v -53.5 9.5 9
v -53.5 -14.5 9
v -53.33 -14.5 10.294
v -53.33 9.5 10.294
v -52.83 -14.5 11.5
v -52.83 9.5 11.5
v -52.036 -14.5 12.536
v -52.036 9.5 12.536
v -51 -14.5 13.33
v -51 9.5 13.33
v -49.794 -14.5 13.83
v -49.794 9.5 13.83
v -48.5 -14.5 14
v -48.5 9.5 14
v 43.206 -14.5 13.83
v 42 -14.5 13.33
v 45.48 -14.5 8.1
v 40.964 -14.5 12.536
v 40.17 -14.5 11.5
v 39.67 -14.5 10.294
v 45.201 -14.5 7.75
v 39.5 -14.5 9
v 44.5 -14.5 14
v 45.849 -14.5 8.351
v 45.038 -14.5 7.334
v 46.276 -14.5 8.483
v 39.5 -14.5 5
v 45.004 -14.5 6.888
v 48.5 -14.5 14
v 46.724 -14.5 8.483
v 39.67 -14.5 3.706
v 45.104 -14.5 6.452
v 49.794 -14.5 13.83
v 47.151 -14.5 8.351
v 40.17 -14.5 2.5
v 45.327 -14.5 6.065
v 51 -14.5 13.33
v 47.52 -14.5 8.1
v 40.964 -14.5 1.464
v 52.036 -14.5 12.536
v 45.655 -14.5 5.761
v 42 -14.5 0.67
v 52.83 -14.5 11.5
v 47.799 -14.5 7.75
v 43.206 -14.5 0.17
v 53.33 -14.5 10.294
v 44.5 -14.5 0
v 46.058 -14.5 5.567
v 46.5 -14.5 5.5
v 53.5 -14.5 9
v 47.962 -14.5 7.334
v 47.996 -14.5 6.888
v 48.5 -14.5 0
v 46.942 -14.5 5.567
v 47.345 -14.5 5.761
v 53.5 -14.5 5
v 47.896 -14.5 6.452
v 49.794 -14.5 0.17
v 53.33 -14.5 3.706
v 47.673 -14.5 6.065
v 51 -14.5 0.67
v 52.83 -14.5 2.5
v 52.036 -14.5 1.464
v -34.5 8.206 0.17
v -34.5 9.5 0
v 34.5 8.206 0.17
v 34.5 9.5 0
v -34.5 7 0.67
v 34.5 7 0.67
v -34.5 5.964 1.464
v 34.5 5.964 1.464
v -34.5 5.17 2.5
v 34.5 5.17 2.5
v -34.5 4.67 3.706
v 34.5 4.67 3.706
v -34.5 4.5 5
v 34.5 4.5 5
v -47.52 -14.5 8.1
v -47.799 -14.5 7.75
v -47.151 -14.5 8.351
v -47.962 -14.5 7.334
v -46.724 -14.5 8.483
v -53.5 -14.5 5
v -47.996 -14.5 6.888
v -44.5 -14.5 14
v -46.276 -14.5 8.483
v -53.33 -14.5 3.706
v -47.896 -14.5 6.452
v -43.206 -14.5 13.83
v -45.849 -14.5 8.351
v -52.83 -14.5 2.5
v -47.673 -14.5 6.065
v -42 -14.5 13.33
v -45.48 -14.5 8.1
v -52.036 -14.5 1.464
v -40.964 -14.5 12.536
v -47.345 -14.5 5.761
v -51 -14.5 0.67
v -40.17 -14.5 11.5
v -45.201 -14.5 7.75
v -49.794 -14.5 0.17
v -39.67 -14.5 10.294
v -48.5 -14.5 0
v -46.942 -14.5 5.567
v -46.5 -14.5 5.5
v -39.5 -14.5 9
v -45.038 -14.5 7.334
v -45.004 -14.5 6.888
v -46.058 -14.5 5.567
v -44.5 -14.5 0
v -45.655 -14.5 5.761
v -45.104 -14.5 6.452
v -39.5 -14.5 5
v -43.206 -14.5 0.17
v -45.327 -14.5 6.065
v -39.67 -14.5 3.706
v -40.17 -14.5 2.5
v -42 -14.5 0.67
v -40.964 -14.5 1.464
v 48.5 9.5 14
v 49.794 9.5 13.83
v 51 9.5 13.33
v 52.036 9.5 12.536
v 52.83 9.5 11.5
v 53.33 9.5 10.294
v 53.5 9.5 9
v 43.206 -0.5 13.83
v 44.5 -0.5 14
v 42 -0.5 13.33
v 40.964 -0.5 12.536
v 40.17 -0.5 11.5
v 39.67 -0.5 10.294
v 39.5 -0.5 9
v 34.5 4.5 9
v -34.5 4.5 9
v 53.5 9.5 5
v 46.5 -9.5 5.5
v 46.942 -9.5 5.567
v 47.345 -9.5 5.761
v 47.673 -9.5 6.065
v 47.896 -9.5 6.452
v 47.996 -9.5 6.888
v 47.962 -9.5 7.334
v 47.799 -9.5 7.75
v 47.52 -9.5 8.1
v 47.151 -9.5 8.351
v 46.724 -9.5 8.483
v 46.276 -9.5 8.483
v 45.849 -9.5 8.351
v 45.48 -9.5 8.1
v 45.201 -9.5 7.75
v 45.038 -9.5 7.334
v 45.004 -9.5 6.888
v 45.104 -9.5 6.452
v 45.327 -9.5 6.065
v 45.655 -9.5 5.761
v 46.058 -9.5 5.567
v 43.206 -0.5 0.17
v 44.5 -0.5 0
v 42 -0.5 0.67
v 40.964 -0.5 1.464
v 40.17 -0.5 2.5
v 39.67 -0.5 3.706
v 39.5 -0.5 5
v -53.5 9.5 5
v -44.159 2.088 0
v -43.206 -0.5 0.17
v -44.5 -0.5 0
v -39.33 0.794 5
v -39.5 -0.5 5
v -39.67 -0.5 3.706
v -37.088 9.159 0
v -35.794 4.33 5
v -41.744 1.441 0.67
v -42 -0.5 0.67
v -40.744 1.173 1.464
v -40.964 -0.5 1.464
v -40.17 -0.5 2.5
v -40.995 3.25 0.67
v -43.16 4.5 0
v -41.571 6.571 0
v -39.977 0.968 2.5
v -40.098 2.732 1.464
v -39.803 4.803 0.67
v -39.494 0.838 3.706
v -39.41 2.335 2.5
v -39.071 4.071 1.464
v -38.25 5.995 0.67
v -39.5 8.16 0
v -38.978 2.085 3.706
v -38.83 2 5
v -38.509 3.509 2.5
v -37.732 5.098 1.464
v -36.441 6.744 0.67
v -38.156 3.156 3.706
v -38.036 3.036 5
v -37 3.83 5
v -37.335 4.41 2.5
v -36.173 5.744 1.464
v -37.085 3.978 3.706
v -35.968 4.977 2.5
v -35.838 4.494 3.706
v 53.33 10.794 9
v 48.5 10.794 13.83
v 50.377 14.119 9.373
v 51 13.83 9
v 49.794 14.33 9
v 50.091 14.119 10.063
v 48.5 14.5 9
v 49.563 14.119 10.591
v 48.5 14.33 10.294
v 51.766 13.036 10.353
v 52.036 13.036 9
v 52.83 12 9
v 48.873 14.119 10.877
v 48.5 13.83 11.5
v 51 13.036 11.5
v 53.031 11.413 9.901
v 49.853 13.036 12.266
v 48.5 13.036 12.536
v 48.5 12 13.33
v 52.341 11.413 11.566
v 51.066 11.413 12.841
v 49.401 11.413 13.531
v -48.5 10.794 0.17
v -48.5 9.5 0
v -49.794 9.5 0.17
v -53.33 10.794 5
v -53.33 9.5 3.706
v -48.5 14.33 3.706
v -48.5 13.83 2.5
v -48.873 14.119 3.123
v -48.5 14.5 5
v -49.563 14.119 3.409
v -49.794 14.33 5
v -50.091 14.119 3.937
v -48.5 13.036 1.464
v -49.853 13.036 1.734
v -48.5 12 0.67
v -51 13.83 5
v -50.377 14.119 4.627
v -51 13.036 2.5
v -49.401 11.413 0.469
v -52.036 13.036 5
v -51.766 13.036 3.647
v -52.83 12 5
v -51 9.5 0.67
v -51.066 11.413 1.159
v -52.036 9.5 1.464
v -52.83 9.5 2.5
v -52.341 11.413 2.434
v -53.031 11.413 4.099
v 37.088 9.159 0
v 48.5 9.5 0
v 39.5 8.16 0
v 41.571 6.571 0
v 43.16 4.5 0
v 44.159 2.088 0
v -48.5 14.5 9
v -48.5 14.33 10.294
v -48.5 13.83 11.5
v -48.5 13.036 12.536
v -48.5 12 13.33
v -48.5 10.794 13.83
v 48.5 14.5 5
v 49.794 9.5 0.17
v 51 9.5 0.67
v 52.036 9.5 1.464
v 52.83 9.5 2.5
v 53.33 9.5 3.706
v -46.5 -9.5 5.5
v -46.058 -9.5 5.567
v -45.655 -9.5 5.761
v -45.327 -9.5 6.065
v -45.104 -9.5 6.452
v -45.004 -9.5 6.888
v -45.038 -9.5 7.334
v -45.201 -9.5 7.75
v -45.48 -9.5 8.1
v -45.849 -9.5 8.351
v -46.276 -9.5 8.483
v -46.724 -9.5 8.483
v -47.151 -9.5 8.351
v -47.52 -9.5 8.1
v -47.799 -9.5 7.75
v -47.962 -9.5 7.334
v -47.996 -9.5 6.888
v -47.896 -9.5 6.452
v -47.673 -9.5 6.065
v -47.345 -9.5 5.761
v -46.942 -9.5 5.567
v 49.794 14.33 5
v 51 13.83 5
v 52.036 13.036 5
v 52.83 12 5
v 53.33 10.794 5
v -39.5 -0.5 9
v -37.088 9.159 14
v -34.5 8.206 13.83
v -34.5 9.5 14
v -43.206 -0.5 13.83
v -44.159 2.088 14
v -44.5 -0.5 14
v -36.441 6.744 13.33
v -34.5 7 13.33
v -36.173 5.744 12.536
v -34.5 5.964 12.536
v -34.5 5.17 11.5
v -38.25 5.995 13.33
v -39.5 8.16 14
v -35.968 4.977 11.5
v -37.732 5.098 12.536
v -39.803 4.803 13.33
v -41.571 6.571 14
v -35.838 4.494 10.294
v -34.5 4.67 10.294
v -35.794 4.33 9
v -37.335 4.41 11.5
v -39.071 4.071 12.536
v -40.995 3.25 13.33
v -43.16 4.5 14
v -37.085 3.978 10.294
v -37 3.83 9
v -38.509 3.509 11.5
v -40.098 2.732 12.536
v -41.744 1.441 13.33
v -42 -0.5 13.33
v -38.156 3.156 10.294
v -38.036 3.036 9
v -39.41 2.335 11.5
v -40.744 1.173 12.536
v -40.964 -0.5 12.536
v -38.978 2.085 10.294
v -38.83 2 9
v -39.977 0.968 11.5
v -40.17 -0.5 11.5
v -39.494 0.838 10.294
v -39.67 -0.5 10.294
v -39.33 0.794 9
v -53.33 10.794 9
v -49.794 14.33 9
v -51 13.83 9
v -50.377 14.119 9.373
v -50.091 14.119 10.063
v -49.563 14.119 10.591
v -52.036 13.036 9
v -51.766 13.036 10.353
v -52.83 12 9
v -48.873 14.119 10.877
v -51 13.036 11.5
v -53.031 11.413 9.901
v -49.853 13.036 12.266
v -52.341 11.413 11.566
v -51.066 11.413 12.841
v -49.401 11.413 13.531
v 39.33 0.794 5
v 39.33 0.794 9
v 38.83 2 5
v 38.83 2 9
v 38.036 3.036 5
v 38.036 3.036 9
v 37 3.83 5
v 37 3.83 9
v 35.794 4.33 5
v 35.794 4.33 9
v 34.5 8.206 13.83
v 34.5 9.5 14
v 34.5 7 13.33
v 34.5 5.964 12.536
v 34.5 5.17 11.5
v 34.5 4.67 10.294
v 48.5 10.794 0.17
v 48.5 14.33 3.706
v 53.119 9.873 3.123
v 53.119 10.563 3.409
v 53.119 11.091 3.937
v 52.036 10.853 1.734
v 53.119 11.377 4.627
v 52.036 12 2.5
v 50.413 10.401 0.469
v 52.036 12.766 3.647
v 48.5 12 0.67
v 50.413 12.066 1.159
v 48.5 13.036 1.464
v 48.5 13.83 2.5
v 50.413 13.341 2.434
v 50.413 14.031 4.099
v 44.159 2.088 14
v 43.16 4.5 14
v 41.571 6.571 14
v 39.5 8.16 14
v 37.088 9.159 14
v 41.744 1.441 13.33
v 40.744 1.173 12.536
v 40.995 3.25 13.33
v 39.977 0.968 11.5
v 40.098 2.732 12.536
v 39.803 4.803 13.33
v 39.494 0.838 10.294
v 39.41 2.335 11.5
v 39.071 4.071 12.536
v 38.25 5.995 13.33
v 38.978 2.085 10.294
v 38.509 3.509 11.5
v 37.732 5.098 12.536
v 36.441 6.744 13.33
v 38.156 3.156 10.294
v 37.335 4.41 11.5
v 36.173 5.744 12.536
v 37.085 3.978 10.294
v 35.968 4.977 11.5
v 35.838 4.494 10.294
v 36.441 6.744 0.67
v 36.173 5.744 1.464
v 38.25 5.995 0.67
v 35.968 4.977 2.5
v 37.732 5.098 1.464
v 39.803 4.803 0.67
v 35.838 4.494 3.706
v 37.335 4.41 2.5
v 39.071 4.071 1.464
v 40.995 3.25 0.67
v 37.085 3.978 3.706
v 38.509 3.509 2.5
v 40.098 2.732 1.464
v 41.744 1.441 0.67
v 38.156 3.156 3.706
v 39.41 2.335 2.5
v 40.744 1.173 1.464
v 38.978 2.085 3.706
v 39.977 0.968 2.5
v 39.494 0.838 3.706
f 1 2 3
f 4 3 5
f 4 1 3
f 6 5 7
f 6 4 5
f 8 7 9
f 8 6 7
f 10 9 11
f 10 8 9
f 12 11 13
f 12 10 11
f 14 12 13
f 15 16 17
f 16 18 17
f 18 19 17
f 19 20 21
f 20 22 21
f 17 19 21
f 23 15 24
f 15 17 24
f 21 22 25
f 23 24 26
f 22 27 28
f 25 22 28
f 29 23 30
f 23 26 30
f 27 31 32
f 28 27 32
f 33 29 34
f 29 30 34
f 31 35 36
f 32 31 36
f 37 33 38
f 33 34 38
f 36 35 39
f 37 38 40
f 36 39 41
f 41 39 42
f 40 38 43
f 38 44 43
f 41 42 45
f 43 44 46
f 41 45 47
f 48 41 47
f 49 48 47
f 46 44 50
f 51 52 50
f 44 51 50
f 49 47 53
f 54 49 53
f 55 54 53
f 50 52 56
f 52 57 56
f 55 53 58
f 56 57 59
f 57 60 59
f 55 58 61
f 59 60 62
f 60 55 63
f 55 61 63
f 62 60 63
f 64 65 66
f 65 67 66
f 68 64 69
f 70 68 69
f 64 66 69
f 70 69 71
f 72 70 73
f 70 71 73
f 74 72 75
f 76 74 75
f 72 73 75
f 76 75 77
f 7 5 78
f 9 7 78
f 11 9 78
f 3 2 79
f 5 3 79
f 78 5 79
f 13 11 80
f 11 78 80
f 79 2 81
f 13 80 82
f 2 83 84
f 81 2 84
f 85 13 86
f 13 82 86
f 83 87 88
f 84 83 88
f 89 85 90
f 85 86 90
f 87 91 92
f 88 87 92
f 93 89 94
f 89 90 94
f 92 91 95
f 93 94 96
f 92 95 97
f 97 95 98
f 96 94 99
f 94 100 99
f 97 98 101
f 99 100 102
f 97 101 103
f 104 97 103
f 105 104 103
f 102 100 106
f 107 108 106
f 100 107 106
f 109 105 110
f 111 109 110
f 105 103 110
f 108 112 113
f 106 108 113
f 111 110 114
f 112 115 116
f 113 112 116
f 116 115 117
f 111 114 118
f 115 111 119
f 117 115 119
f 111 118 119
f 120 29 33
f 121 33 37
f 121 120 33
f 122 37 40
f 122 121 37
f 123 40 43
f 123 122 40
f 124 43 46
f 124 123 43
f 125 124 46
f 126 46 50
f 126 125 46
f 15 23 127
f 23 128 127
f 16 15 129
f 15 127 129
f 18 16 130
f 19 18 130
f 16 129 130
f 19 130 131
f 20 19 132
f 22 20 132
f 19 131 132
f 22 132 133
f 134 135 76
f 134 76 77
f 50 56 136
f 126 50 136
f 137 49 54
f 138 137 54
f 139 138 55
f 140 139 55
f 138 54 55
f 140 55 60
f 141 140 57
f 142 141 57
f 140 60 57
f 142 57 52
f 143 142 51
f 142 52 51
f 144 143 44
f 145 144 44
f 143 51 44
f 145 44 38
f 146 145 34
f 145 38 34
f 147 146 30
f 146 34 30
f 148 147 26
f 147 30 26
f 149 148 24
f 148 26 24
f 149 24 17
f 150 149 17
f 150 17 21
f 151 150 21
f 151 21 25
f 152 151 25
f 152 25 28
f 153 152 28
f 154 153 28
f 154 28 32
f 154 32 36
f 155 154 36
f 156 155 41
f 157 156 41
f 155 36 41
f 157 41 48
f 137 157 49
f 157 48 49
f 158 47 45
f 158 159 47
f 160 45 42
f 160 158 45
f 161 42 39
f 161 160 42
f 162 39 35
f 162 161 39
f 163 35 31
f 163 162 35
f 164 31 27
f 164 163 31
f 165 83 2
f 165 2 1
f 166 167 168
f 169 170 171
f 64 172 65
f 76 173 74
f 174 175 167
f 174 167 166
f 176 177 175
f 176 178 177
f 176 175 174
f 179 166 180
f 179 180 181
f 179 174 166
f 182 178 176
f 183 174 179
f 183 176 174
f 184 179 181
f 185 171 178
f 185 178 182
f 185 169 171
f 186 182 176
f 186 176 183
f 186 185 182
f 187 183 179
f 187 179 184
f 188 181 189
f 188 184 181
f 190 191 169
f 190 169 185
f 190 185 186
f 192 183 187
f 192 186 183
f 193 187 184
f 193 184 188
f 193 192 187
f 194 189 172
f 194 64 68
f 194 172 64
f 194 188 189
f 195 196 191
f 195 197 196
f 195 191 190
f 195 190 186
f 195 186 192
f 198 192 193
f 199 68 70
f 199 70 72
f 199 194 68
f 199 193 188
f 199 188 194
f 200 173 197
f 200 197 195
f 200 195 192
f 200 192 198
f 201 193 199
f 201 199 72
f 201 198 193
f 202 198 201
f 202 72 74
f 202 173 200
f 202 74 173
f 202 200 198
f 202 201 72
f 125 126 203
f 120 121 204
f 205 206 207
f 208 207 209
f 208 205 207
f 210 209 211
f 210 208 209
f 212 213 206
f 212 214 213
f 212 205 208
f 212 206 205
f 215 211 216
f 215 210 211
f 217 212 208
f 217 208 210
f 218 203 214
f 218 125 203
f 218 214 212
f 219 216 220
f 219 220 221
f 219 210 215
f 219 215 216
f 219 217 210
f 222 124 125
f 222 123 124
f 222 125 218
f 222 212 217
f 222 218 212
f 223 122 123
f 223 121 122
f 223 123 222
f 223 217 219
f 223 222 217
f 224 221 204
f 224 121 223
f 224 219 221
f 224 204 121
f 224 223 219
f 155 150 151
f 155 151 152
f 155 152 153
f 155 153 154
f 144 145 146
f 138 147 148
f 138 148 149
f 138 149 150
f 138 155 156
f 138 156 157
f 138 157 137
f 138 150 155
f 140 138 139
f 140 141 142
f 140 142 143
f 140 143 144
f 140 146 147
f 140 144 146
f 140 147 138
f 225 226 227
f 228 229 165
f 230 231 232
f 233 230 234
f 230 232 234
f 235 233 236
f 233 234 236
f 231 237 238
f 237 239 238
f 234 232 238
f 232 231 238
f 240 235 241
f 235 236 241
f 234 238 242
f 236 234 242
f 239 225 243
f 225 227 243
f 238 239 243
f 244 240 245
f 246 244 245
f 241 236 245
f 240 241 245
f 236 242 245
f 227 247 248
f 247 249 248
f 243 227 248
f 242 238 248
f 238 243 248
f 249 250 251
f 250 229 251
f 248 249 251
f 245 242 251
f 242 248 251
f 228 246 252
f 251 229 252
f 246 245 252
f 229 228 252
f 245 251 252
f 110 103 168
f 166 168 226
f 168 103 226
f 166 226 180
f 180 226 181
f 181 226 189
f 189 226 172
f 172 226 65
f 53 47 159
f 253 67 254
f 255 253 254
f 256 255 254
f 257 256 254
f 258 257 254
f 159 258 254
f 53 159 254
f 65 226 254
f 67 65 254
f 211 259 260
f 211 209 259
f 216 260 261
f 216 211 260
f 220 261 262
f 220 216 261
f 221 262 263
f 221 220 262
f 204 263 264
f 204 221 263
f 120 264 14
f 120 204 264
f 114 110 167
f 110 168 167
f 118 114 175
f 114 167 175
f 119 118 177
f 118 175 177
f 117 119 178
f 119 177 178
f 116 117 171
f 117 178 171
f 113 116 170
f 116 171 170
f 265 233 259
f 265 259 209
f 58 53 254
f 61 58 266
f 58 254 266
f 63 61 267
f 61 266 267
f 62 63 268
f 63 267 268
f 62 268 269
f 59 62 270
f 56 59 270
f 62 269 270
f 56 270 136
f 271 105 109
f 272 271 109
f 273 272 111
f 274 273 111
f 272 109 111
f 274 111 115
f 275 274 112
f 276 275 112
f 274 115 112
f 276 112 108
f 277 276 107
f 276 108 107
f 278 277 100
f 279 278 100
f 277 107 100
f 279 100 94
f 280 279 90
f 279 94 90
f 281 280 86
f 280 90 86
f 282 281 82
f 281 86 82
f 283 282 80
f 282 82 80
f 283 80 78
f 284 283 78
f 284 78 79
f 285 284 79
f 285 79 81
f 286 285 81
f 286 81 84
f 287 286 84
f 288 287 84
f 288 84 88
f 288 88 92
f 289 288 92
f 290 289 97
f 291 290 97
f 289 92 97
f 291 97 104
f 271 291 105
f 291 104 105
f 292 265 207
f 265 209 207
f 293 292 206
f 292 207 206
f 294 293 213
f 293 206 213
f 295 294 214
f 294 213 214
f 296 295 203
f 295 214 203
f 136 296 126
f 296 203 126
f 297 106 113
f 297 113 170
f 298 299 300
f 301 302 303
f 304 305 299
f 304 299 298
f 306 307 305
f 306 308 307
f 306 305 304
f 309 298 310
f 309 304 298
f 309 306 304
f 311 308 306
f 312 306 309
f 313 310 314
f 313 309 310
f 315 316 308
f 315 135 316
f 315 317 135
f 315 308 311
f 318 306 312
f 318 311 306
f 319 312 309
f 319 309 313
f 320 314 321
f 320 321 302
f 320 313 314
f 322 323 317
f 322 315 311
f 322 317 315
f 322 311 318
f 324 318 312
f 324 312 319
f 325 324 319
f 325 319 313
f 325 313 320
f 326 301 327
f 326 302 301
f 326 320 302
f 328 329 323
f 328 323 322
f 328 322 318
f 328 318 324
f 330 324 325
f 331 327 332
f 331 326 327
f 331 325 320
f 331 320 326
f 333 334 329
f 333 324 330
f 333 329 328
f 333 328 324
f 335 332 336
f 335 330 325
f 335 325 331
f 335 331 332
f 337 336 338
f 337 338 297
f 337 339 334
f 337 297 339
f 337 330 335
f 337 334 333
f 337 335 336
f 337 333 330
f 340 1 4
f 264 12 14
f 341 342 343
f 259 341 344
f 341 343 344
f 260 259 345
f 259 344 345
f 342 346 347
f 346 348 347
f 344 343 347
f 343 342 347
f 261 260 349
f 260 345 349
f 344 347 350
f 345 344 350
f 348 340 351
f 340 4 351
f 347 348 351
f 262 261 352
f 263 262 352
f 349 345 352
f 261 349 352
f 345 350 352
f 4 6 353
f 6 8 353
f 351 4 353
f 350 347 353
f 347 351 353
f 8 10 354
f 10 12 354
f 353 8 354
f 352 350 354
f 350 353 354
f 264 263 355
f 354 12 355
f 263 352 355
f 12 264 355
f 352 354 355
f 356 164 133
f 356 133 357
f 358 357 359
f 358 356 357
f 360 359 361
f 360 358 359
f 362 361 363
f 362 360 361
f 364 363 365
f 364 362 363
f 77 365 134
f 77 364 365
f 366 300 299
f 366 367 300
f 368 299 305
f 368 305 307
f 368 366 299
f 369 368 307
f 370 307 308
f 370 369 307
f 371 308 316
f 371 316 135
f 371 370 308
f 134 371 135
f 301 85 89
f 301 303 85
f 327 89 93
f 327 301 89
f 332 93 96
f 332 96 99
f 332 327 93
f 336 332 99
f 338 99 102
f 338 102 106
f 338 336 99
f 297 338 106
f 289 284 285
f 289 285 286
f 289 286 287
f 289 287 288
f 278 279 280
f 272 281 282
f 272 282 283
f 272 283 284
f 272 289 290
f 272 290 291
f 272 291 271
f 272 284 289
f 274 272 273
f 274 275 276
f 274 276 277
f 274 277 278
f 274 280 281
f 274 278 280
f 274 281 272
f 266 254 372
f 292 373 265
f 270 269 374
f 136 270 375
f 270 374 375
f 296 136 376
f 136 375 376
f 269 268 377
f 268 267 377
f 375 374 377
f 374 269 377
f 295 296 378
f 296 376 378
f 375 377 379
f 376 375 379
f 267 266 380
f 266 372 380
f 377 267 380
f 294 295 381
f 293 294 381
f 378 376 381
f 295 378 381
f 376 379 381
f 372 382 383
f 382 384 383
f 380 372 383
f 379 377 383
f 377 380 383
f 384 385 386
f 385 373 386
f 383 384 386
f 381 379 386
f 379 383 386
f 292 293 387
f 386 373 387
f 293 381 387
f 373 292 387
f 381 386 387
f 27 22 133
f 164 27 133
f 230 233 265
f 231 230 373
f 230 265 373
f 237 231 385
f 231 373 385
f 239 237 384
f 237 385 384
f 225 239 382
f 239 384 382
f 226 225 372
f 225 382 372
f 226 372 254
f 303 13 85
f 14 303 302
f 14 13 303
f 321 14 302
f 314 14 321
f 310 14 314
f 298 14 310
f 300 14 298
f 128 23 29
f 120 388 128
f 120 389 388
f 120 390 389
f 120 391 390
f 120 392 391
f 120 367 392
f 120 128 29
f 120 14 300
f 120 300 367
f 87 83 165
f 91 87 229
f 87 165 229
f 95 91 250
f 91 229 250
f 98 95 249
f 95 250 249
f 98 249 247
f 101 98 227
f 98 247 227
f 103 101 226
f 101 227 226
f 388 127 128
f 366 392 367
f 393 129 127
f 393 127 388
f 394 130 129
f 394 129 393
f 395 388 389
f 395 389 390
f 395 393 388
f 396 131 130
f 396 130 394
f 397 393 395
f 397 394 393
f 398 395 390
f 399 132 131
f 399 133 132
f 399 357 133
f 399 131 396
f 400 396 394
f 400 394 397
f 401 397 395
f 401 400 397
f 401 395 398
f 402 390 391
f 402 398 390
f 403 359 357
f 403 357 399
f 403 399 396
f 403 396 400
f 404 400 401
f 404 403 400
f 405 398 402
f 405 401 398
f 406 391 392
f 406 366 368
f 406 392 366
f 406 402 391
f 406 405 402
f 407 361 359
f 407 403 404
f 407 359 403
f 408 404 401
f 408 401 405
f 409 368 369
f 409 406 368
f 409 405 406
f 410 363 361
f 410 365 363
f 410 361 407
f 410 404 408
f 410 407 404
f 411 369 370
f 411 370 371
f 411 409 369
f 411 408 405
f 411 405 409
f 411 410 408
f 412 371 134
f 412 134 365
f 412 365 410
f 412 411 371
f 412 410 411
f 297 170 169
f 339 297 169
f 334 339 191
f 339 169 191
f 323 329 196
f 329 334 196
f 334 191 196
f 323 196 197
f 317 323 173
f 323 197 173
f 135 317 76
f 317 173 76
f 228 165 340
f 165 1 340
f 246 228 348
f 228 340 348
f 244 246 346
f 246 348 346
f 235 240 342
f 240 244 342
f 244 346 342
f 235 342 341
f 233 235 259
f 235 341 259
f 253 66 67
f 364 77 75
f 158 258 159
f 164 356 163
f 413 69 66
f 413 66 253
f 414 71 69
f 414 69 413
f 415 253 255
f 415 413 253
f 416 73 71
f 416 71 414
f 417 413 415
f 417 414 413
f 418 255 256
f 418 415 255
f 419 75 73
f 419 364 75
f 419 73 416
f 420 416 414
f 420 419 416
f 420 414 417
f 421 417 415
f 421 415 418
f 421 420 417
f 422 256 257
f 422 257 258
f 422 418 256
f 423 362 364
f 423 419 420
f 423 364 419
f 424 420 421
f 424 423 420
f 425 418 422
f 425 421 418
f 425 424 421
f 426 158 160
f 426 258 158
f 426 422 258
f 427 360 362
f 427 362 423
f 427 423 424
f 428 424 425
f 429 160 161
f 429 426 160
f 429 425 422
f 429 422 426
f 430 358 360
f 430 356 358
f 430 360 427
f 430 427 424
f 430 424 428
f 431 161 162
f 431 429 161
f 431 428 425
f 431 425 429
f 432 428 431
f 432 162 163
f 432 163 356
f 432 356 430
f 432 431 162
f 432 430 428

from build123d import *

# Parameters (mm, degrees)
ESQUISSE1_W             = 107
ESQUISSE1_H             = 29
BOSS_EXTRU_1_DEPTH      = 14
ESQUISSE2_W             = 79
ESQUISSE2_H             = 19
ENL_V_MAT_EXTRU_1_DEPTH = 58.170796741
CONG_1_R                = 5
ESQUISSE3_R             = 1.5
ENL_V_MAT_EXTRU_2_DEPTH = 5


with BuildPart() as part:
    # Esquisse1 → Boss.-Extru.1 (new body)
    with BuildSketch(Plane.XY):
        Rectangle(ESQUISSE1_W, ESQUISSE1_H)
    extrude(amount=BOSS_EXTRU_1_DEPTH)

    # Esquisse2 → Enlèv. mat.-Extru.1 (cut, through all)
    with BuildSketch(Plane.XY.offset(14)):
        with Locations((0, -5)):
            Rectangle(ESQUISSE2_W, ESQUISSE2_H)
    extrude(amount=-ENL_V_MAT_EXTRU_1_DEPTH, mode=Mode.SUBTRACT)

    # Congé1
    cong_1_edges = [part.edges().sort_by_distance(p)[0] for p in [
        (-53.5, 0, 14),
        (39.5, -5, 0),
        (39.5, 4.5, 7),
        (-39.5, -5, 0),
        (0, 4.5, 0),
        (-39.5, 4.5, 7),
        (39.5, -5, 14),
        (0, 4.5, 14),
        (-39.5, -5, 14),
        (53.5, 0, 14),
        (-53.5, 0, 0),
        (0, 14.5, 0),
        (53.5, 0, 0),
        (-53.5, 14.5, 7),
        (53.5, 14.5, 7),
        (0, 14.5, 14),
    ]]
    fillet(cong_1_edges, radius=CONG_1_R - 0.0001)  # a hair under: the kernel refuses the full size

    # Esquisse3 → Enlèv. mat.-Extru.2 (cut)
    with BuildSketch(Plane.XZ.offset(14.5)):
        with Locations(Location((-46.5, 7, 0), (0, 0, 270))):
            Circle(ESQUISSE3_R)
        with Locations(Location((46.5, 7, 0), (0, 0, 270))):
            Circle(ESQUISSE3_R)
    extrude(amount=-ENL_V_MAT_EXTRU_2_DEPTH, mode=Mode.SUBTRACT)


solid = part.part
